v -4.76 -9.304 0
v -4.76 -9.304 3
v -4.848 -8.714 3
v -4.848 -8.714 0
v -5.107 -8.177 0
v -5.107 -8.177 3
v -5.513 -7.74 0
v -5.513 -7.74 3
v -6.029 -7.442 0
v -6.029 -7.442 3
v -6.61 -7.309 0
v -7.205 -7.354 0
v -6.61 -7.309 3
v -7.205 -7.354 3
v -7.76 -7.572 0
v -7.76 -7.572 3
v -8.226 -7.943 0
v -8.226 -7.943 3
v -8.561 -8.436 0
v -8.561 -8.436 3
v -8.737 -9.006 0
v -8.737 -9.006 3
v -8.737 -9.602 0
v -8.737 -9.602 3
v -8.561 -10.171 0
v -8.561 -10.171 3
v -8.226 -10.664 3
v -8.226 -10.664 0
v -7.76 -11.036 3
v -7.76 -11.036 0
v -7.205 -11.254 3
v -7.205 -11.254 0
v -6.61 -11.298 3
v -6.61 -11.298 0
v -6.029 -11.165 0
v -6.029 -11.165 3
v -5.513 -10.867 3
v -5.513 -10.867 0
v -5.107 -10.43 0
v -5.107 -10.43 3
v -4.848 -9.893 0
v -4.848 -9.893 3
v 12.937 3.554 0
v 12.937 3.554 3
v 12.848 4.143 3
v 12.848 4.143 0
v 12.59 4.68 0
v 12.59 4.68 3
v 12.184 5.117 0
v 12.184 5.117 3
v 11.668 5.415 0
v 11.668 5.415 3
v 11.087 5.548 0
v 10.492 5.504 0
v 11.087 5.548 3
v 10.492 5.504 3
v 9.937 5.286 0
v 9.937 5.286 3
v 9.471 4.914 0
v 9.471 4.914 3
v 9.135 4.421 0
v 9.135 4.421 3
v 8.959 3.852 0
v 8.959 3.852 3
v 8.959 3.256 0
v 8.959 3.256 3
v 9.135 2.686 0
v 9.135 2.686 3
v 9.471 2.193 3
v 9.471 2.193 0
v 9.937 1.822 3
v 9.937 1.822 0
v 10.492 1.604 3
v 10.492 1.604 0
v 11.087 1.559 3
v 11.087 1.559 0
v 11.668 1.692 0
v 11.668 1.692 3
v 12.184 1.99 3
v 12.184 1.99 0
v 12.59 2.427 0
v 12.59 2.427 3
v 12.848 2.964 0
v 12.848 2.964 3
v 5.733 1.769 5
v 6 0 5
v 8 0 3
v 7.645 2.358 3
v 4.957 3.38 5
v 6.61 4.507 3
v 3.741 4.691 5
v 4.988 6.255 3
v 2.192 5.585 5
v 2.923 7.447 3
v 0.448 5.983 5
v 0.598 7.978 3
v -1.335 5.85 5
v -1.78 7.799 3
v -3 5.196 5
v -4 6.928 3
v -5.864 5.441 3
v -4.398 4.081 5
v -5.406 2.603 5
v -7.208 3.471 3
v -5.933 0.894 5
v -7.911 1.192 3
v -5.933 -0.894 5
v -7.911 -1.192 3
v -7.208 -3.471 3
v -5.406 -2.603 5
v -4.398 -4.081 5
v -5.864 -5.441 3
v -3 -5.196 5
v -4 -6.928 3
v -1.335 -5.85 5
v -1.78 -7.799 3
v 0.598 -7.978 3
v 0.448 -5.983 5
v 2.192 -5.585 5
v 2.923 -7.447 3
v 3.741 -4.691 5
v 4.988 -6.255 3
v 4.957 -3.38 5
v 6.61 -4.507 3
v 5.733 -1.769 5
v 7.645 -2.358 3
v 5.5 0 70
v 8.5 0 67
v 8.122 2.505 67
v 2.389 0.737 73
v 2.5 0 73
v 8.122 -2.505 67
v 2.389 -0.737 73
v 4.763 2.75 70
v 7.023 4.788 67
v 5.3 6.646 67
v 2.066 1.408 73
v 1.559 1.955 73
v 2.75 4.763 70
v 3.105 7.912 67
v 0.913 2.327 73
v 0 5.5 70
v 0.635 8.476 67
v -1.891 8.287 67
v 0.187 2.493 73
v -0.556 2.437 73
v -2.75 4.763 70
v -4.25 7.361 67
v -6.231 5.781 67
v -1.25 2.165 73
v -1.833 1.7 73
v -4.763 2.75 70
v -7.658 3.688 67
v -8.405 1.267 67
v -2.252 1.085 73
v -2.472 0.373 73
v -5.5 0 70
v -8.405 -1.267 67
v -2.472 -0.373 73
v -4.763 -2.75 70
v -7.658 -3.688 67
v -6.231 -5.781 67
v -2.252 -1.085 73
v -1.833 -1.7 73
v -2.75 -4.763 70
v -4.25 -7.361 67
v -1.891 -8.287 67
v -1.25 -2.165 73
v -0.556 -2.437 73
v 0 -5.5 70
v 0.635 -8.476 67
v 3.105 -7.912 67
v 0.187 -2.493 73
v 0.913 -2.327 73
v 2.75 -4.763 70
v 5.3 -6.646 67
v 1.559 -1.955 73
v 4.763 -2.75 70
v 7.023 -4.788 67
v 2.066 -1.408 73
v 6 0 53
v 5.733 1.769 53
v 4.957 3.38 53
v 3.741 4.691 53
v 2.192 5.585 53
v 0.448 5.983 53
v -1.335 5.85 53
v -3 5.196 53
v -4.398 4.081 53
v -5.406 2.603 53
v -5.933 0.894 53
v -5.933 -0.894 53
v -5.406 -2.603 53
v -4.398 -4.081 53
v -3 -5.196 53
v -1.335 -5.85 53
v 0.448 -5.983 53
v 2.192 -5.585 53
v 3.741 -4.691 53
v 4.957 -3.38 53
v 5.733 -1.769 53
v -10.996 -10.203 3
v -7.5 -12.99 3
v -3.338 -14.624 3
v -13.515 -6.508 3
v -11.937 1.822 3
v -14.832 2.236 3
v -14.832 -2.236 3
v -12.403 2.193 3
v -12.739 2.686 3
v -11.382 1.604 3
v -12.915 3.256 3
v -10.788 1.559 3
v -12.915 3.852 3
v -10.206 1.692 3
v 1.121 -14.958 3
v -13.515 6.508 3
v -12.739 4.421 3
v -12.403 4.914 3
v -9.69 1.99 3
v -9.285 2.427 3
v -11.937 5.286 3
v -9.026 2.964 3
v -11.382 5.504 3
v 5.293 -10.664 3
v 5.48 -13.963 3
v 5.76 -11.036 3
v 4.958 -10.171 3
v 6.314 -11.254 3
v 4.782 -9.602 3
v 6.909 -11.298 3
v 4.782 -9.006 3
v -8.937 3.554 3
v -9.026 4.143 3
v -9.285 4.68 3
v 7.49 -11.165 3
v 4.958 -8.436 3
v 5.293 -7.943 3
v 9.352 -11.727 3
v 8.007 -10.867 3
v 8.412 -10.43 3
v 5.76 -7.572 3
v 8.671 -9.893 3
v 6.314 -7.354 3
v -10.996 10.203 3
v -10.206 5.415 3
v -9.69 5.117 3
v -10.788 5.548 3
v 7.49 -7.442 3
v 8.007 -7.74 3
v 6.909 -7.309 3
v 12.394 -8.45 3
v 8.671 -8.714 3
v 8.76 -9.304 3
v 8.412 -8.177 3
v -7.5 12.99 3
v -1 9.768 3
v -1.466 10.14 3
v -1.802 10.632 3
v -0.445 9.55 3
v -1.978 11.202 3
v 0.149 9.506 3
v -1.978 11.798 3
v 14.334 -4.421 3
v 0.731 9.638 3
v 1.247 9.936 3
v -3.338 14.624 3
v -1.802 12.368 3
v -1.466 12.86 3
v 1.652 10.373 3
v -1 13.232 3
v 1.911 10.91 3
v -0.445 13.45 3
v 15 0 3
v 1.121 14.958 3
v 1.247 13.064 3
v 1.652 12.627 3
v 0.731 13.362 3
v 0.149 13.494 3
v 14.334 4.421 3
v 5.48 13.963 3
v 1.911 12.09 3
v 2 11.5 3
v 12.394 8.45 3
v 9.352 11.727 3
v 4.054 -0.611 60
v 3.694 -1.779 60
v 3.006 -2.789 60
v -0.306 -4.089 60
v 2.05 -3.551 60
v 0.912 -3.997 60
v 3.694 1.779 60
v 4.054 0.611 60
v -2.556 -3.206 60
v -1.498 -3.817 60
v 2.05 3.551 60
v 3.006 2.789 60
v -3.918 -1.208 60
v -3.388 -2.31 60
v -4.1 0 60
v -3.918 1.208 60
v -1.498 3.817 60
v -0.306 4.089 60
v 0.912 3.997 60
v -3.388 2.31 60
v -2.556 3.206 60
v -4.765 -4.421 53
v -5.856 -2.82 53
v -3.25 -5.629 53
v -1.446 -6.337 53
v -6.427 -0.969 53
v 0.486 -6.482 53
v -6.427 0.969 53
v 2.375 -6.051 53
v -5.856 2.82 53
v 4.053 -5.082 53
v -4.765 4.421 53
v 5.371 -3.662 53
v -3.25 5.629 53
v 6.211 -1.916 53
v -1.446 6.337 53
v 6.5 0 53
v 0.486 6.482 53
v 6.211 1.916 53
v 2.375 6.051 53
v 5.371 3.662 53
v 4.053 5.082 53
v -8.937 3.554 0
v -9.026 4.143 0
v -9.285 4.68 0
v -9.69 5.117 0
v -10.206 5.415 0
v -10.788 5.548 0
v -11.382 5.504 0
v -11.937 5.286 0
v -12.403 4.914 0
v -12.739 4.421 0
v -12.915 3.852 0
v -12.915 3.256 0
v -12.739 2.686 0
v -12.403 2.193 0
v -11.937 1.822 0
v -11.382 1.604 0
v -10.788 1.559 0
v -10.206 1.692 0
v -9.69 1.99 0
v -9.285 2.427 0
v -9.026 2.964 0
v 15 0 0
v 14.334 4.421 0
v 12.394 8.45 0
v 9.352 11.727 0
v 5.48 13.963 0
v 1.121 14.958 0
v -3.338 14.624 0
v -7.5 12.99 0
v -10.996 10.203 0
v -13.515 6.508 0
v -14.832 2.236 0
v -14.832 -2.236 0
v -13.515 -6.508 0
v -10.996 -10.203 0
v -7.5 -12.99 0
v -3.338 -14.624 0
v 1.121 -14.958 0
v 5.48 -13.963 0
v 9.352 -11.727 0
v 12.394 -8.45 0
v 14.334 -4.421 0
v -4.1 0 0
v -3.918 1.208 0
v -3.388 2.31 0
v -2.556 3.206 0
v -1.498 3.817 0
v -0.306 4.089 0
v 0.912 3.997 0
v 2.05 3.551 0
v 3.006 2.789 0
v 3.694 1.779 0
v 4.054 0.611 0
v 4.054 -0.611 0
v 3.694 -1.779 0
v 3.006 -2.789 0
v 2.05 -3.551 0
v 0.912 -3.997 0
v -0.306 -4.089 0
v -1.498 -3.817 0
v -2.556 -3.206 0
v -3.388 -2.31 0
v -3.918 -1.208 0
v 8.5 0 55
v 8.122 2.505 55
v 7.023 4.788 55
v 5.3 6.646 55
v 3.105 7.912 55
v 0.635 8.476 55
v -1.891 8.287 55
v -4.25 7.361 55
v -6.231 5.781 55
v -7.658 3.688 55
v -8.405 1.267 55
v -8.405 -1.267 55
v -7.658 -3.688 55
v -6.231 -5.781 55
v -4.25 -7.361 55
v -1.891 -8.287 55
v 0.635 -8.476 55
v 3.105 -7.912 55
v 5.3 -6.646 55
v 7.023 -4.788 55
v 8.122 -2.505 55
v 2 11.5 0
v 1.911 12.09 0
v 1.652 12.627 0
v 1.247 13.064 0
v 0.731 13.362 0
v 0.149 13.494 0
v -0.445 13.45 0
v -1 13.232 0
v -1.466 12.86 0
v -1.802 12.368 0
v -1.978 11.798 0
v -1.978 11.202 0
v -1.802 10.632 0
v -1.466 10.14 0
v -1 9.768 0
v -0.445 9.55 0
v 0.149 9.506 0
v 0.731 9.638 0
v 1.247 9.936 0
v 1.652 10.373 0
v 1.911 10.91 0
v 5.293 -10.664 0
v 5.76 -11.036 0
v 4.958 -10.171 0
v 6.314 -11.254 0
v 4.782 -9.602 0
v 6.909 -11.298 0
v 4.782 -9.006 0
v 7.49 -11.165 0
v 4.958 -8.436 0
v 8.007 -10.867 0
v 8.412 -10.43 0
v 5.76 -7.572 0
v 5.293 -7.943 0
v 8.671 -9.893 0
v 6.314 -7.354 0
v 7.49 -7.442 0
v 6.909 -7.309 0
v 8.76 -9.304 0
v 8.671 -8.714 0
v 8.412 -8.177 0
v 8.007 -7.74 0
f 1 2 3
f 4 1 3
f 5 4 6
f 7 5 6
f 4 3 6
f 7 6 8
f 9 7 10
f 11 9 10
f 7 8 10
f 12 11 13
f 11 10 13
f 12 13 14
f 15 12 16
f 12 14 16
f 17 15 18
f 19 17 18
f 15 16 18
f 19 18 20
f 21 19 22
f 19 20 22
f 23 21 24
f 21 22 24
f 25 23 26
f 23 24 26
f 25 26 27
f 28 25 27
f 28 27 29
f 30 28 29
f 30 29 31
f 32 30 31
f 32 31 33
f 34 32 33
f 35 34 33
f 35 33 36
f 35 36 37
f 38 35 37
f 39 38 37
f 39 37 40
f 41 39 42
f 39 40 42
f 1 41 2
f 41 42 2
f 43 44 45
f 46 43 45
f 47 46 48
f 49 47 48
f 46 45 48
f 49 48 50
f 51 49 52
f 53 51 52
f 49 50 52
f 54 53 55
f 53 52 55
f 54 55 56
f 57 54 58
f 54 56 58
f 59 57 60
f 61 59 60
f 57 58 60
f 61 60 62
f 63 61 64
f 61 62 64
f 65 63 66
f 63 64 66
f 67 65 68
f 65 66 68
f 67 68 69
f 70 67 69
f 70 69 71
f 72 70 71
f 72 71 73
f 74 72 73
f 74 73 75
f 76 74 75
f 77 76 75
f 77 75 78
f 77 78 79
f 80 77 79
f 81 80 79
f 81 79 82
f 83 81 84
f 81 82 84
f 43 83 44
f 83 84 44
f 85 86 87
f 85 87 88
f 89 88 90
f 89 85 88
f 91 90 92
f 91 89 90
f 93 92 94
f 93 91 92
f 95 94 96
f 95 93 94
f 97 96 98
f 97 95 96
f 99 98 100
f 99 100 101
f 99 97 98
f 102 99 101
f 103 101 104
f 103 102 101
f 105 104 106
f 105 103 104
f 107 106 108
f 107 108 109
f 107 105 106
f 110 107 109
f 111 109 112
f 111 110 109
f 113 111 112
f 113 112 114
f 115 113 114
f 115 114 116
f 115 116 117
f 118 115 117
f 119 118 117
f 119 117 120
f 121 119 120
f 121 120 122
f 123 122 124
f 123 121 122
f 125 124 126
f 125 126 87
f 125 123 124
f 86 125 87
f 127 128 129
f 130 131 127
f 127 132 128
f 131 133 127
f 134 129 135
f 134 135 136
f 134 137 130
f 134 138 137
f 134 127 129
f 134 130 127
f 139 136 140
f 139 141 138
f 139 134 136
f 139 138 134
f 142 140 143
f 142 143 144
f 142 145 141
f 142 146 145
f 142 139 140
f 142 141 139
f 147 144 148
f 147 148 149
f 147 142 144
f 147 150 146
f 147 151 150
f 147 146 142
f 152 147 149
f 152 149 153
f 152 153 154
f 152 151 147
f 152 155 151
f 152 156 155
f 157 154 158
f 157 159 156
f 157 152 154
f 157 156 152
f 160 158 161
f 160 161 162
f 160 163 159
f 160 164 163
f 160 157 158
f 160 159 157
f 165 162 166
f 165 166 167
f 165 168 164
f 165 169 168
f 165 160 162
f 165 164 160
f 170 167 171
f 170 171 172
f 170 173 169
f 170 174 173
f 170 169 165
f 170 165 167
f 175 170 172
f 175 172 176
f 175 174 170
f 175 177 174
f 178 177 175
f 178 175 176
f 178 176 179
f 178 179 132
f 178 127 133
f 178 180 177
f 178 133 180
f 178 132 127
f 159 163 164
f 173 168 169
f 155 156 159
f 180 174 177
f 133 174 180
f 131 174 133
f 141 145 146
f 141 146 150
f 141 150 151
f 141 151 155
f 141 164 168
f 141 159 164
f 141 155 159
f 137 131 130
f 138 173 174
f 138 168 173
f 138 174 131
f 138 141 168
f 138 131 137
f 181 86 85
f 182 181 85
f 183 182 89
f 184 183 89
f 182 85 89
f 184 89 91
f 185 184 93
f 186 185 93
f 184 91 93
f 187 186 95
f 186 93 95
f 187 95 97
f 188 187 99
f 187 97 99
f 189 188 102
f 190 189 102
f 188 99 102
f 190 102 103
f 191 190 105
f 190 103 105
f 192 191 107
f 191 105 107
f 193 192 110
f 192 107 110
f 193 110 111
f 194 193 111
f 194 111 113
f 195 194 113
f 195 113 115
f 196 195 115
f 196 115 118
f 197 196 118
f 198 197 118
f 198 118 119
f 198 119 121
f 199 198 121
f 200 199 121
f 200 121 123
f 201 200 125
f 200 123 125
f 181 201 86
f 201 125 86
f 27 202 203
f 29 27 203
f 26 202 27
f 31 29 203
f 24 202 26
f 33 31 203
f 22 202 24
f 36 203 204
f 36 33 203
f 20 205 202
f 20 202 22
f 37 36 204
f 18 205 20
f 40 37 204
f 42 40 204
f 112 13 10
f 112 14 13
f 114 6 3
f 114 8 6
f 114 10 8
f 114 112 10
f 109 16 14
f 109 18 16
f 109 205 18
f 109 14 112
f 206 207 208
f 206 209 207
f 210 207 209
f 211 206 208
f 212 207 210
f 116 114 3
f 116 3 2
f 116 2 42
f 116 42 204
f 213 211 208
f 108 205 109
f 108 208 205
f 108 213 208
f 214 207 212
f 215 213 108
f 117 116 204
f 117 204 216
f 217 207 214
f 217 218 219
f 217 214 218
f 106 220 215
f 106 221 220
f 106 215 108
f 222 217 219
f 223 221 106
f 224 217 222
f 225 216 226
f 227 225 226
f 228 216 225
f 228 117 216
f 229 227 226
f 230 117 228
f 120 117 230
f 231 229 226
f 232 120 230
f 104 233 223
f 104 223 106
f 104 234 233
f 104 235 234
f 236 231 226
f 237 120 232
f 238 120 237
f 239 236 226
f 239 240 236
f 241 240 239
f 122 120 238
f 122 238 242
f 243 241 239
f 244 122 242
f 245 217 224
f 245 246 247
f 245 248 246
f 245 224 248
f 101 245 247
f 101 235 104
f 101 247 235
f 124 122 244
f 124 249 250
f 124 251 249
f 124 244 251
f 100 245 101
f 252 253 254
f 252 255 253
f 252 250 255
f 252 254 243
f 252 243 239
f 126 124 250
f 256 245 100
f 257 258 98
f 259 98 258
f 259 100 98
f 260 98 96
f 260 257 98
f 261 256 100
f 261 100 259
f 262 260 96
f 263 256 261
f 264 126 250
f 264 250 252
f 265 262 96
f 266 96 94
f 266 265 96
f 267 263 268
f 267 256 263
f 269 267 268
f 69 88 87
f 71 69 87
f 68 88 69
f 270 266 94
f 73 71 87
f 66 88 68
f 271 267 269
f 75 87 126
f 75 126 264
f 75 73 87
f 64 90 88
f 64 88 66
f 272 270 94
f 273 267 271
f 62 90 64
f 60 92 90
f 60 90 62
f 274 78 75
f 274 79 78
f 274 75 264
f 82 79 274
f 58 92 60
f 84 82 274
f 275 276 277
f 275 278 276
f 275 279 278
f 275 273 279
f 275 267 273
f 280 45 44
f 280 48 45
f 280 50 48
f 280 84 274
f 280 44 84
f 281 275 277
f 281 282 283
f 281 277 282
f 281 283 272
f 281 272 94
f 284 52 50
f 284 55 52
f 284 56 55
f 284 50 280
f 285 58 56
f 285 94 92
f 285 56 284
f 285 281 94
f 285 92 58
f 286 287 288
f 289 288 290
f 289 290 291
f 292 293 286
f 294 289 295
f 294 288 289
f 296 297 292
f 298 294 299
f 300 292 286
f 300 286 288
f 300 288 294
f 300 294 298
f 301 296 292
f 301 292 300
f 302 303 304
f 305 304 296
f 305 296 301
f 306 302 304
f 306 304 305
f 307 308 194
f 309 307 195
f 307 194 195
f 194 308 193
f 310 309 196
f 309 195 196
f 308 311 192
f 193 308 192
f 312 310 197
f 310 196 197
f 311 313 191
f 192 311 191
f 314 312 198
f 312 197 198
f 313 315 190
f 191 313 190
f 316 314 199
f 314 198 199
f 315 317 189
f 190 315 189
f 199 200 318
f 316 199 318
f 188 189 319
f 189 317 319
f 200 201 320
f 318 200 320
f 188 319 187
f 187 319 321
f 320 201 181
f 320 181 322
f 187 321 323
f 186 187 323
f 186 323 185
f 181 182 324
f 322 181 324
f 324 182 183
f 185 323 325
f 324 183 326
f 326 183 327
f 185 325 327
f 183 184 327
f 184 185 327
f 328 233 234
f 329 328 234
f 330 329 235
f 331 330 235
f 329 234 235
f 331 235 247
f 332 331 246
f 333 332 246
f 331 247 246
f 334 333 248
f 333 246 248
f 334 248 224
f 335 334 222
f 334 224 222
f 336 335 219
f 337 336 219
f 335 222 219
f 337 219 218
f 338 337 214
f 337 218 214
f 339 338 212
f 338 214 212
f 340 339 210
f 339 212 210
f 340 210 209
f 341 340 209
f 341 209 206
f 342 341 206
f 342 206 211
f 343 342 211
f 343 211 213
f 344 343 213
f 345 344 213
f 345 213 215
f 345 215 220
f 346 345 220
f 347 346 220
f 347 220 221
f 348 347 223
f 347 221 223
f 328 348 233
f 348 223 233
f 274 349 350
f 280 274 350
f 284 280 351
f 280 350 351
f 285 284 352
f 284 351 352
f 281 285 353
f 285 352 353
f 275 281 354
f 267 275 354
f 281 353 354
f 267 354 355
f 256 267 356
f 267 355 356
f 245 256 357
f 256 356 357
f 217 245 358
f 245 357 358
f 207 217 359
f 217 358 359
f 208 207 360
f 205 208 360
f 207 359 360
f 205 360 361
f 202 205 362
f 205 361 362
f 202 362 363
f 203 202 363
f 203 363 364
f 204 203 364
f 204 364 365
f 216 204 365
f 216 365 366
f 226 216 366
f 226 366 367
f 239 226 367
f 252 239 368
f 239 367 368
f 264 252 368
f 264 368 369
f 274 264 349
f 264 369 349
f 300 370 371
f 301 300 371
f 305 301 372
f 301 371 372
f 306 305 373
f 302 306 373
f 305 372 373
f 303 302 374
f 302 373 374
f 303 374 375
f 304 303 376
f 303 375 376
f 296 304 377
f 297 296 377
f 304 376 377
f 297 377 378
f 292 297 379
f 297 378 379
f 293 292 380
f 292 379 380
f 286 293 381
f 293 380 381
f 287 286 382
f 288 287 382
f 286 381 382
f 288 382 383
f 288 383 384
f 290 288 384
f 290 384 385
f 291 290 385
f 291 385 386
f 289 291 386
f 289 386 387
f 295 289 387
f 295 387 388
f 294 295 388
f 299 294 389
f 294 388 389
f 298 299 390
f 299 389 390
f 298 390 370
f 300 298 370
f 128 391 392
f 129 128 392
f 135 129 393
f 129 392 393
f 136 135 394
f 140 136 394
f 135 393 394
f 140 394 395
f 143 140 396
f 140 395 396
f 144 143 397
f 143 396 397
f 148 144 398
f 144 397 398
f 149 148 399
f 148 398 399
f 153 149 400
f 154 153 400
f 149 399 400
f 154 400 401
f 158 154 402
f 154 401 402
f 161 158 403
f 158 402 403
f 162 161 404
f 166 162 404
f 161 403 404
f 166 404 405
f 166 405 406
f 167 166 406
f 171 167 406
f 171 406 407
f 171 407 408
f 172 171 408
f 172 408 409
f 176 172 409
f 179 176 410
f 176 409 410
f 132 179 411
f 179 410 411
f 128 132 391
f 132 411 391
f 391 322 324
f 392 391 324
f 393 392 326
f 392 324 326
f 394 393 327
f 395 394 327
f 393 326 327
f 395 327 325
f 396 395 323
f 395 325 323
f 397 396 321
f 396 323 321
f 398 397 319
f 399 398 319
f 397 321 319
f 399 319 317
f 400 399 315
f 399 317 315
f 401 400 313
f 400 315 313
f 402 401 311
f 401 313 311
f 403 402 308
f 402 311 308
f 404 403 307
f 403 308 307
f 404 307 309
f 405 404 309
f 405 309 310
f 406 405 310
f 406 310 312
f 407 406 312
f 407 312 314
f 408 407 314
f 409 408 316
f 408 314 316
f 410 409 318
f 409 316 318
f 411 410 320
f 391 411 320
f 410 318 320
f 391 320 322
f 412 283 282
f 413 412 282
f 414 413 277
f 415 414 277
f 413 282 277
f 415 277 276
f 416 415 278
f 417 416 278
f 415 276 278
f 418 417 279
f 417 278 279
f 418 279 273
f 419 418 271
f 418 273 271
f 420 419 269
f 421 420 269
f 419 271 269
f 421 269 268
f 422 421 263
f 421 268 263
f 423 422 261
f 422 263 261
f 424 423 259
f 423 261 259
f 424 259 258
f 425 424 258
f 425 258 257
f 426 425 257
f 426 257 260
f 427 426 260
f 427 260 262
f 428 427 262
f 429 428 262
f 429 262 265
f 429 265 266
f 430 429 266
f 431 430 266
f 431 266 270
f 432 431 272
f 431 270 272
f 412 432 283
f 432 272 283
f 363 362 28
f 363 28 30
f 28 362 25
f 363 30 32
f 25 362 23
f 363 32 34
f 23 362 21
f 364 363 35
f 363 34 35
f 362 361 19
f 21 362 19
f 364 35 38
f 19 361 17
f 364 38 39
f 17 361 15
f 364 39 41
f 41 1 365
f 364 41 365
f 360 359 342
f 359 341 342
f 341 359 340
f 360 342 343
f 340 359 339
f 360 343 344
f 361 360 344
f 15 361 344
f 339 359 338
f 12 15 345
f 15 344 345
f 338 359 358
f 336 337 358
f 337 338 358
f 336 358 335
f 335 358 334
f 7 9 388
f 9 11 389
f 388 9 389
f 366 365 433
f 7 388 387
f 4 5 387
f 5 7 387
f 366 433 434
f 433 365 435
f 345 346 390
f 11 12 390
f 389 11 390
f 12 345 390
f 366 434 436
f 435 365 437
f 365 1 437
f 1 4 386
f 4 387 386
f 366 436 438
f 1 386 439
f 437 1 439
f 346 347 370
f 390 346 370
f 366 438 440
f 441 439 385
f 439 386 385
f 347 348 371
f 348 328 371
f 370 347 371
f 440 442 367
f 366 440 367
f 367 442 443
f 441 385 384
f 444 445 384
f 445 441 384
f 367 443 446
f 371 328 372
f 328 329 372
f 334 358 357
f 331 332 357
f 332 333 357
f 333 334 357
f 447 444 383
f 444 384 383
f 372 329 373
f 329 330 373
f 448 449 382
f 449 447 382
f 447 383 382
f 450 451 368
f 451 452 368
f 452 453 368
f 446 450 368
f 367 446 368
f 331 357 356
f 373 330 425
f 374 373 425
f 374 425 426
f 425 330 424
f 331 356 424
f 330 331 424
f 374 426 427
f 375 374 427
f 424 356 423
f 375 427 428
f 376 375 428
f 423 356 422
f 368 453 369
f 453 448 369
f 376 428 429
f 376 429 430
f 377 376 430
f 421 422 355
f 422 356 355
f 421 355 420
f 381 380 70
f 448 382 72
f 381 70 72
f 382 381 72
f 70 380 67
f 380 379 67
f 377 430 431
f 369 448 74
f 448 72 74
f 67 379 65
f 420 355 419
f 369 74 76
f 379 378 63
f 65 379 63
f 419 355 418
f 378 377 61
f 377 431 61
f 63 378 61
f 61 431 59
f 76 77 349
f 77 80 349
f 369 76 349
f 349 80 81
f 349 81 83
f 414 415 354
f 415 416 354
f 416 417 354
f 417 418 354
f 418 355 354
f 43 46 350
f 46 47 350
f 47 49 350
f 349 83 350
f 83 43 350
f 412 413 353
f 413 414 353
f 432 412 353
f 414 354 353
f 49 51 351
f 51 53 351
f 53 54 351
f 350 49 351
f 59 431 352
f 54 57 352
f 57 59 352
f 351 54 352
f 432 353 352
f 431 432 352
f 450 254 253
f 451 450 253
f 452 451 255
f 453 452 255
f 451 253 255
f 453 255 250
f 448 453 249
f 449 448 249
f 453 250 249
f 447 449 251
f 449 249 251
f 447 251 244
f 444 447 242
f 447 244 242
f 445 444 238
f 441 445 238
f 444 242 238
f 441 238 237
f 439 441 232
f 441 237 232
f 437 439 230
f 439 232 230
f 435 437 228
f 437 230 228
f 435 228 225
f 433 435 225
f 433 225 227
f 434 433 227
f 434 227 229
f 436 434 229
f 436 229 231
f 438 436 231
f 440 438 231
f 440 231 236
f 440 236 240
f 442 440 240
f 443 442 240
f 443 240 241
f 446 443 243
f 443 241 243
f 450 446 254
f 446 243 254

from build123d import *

# Parameters (mm, degrees)
SKETCH1_R           = 15
BOSS_EXTRUDE1_DEPTH = 3
SKETCH2_R           = 2
CUT_EXTRUDE1_DEPTH  = 3
SKETCH3_R           = 6
BOSS_EXTRUDE5_DEPTH = 50
CHAMFER1_SIZE       = 2
SKETCH5_R           = 8.5
BOSS_EXTRUDE6_DEPTH = 20
CHAMFER2_SIZE       = 6
CHAMFER3_SIZE       = 2
SKETCH6_R           = 4.1
CUT_EXTRUDE2_DEPTH  = 60


with BuildPart() as part:
    # Sketch1 → Boss-Extrude1 (new body)
    with BuildSketch(Plane.XY):
        Circle(SKETCH1_R)
    extrude(amount=BOSS_EXTRUDE1_DEPTH)

    # Sketch2 → Cut-Extrude1 (cut)
    with BuildSketch(Plane.XY.offset(3)):
        with Locations((0, 11.5)):
            Circle(SKETCH2_R)
        with Locations((10.937149937, 3.553695435)):
            Circle(SKETCH2_R)
        with Locations((6.759530401, -9.303695435)):
            Circle(SKETCH2_R)
        with Locations((-6.759530401, -9.303695435)):
            Circle(SKETCH2_R)
        with Locations((-10.937149937, 3.553695435)):
            Circle(SKETCH2_R)
    extrude(amount=-CUT_EXTRUDE1_DEPTH, mode=Mode.SUBTRACT)

    # Sketch3 → Boss-Extrude5 (add)
    with BuildSketch(Plane.XY.offset(3)):
        Circle(SKETCH3_R)
    extrude(amount=BOSS_EXTRUDE5_DEPTH)

    # Chamfer1
    chamfer1_edges = [part.edges().sort_by_distance(p)[0] for p in [
        (-6, 0, 3),
    ]]
    chamfer(chamfer1_edges, length=CHAMFER1_SIZE)

    # Sketch5 → Boss-Extrude6 (add)
    with BuildSketch(Plane.XY.offset(53)):
        Circle(SKETCH5_R)
    extrude(amount=BOSS_EXTRUDE6_DEPTH)

    # Chamfer2
    chamfer2_edges = [part.edges().sort_by_distance(p)[0] for p in [
        (-8.5, 0, 73),
    ]]
    chamfer(chamfer2_edges, length=CHAMFER2_SIZE)

    # Chamfer3
    chamfer3_edges = [part.edges().sort_by_distance(p)[0] for p in [
        (-8.5, 0, 53),
    ]]
    chamfer(chamfer3_edges, length=CHAMFER3_SIZE)

    # Sketch6 → Cut-Extrude2 (cut)
    with BuildSketch(Plane(origin=(0, 0, 0), x_dir=(-1, 0, 0), z_dir=(0, 0, -1))):
        Circle(SKETCH6_R)
    extrude(amount=-CUT_EXTRUDE2_DEPTH, mode=Mode.SUBTRACT)


solid = part.part
